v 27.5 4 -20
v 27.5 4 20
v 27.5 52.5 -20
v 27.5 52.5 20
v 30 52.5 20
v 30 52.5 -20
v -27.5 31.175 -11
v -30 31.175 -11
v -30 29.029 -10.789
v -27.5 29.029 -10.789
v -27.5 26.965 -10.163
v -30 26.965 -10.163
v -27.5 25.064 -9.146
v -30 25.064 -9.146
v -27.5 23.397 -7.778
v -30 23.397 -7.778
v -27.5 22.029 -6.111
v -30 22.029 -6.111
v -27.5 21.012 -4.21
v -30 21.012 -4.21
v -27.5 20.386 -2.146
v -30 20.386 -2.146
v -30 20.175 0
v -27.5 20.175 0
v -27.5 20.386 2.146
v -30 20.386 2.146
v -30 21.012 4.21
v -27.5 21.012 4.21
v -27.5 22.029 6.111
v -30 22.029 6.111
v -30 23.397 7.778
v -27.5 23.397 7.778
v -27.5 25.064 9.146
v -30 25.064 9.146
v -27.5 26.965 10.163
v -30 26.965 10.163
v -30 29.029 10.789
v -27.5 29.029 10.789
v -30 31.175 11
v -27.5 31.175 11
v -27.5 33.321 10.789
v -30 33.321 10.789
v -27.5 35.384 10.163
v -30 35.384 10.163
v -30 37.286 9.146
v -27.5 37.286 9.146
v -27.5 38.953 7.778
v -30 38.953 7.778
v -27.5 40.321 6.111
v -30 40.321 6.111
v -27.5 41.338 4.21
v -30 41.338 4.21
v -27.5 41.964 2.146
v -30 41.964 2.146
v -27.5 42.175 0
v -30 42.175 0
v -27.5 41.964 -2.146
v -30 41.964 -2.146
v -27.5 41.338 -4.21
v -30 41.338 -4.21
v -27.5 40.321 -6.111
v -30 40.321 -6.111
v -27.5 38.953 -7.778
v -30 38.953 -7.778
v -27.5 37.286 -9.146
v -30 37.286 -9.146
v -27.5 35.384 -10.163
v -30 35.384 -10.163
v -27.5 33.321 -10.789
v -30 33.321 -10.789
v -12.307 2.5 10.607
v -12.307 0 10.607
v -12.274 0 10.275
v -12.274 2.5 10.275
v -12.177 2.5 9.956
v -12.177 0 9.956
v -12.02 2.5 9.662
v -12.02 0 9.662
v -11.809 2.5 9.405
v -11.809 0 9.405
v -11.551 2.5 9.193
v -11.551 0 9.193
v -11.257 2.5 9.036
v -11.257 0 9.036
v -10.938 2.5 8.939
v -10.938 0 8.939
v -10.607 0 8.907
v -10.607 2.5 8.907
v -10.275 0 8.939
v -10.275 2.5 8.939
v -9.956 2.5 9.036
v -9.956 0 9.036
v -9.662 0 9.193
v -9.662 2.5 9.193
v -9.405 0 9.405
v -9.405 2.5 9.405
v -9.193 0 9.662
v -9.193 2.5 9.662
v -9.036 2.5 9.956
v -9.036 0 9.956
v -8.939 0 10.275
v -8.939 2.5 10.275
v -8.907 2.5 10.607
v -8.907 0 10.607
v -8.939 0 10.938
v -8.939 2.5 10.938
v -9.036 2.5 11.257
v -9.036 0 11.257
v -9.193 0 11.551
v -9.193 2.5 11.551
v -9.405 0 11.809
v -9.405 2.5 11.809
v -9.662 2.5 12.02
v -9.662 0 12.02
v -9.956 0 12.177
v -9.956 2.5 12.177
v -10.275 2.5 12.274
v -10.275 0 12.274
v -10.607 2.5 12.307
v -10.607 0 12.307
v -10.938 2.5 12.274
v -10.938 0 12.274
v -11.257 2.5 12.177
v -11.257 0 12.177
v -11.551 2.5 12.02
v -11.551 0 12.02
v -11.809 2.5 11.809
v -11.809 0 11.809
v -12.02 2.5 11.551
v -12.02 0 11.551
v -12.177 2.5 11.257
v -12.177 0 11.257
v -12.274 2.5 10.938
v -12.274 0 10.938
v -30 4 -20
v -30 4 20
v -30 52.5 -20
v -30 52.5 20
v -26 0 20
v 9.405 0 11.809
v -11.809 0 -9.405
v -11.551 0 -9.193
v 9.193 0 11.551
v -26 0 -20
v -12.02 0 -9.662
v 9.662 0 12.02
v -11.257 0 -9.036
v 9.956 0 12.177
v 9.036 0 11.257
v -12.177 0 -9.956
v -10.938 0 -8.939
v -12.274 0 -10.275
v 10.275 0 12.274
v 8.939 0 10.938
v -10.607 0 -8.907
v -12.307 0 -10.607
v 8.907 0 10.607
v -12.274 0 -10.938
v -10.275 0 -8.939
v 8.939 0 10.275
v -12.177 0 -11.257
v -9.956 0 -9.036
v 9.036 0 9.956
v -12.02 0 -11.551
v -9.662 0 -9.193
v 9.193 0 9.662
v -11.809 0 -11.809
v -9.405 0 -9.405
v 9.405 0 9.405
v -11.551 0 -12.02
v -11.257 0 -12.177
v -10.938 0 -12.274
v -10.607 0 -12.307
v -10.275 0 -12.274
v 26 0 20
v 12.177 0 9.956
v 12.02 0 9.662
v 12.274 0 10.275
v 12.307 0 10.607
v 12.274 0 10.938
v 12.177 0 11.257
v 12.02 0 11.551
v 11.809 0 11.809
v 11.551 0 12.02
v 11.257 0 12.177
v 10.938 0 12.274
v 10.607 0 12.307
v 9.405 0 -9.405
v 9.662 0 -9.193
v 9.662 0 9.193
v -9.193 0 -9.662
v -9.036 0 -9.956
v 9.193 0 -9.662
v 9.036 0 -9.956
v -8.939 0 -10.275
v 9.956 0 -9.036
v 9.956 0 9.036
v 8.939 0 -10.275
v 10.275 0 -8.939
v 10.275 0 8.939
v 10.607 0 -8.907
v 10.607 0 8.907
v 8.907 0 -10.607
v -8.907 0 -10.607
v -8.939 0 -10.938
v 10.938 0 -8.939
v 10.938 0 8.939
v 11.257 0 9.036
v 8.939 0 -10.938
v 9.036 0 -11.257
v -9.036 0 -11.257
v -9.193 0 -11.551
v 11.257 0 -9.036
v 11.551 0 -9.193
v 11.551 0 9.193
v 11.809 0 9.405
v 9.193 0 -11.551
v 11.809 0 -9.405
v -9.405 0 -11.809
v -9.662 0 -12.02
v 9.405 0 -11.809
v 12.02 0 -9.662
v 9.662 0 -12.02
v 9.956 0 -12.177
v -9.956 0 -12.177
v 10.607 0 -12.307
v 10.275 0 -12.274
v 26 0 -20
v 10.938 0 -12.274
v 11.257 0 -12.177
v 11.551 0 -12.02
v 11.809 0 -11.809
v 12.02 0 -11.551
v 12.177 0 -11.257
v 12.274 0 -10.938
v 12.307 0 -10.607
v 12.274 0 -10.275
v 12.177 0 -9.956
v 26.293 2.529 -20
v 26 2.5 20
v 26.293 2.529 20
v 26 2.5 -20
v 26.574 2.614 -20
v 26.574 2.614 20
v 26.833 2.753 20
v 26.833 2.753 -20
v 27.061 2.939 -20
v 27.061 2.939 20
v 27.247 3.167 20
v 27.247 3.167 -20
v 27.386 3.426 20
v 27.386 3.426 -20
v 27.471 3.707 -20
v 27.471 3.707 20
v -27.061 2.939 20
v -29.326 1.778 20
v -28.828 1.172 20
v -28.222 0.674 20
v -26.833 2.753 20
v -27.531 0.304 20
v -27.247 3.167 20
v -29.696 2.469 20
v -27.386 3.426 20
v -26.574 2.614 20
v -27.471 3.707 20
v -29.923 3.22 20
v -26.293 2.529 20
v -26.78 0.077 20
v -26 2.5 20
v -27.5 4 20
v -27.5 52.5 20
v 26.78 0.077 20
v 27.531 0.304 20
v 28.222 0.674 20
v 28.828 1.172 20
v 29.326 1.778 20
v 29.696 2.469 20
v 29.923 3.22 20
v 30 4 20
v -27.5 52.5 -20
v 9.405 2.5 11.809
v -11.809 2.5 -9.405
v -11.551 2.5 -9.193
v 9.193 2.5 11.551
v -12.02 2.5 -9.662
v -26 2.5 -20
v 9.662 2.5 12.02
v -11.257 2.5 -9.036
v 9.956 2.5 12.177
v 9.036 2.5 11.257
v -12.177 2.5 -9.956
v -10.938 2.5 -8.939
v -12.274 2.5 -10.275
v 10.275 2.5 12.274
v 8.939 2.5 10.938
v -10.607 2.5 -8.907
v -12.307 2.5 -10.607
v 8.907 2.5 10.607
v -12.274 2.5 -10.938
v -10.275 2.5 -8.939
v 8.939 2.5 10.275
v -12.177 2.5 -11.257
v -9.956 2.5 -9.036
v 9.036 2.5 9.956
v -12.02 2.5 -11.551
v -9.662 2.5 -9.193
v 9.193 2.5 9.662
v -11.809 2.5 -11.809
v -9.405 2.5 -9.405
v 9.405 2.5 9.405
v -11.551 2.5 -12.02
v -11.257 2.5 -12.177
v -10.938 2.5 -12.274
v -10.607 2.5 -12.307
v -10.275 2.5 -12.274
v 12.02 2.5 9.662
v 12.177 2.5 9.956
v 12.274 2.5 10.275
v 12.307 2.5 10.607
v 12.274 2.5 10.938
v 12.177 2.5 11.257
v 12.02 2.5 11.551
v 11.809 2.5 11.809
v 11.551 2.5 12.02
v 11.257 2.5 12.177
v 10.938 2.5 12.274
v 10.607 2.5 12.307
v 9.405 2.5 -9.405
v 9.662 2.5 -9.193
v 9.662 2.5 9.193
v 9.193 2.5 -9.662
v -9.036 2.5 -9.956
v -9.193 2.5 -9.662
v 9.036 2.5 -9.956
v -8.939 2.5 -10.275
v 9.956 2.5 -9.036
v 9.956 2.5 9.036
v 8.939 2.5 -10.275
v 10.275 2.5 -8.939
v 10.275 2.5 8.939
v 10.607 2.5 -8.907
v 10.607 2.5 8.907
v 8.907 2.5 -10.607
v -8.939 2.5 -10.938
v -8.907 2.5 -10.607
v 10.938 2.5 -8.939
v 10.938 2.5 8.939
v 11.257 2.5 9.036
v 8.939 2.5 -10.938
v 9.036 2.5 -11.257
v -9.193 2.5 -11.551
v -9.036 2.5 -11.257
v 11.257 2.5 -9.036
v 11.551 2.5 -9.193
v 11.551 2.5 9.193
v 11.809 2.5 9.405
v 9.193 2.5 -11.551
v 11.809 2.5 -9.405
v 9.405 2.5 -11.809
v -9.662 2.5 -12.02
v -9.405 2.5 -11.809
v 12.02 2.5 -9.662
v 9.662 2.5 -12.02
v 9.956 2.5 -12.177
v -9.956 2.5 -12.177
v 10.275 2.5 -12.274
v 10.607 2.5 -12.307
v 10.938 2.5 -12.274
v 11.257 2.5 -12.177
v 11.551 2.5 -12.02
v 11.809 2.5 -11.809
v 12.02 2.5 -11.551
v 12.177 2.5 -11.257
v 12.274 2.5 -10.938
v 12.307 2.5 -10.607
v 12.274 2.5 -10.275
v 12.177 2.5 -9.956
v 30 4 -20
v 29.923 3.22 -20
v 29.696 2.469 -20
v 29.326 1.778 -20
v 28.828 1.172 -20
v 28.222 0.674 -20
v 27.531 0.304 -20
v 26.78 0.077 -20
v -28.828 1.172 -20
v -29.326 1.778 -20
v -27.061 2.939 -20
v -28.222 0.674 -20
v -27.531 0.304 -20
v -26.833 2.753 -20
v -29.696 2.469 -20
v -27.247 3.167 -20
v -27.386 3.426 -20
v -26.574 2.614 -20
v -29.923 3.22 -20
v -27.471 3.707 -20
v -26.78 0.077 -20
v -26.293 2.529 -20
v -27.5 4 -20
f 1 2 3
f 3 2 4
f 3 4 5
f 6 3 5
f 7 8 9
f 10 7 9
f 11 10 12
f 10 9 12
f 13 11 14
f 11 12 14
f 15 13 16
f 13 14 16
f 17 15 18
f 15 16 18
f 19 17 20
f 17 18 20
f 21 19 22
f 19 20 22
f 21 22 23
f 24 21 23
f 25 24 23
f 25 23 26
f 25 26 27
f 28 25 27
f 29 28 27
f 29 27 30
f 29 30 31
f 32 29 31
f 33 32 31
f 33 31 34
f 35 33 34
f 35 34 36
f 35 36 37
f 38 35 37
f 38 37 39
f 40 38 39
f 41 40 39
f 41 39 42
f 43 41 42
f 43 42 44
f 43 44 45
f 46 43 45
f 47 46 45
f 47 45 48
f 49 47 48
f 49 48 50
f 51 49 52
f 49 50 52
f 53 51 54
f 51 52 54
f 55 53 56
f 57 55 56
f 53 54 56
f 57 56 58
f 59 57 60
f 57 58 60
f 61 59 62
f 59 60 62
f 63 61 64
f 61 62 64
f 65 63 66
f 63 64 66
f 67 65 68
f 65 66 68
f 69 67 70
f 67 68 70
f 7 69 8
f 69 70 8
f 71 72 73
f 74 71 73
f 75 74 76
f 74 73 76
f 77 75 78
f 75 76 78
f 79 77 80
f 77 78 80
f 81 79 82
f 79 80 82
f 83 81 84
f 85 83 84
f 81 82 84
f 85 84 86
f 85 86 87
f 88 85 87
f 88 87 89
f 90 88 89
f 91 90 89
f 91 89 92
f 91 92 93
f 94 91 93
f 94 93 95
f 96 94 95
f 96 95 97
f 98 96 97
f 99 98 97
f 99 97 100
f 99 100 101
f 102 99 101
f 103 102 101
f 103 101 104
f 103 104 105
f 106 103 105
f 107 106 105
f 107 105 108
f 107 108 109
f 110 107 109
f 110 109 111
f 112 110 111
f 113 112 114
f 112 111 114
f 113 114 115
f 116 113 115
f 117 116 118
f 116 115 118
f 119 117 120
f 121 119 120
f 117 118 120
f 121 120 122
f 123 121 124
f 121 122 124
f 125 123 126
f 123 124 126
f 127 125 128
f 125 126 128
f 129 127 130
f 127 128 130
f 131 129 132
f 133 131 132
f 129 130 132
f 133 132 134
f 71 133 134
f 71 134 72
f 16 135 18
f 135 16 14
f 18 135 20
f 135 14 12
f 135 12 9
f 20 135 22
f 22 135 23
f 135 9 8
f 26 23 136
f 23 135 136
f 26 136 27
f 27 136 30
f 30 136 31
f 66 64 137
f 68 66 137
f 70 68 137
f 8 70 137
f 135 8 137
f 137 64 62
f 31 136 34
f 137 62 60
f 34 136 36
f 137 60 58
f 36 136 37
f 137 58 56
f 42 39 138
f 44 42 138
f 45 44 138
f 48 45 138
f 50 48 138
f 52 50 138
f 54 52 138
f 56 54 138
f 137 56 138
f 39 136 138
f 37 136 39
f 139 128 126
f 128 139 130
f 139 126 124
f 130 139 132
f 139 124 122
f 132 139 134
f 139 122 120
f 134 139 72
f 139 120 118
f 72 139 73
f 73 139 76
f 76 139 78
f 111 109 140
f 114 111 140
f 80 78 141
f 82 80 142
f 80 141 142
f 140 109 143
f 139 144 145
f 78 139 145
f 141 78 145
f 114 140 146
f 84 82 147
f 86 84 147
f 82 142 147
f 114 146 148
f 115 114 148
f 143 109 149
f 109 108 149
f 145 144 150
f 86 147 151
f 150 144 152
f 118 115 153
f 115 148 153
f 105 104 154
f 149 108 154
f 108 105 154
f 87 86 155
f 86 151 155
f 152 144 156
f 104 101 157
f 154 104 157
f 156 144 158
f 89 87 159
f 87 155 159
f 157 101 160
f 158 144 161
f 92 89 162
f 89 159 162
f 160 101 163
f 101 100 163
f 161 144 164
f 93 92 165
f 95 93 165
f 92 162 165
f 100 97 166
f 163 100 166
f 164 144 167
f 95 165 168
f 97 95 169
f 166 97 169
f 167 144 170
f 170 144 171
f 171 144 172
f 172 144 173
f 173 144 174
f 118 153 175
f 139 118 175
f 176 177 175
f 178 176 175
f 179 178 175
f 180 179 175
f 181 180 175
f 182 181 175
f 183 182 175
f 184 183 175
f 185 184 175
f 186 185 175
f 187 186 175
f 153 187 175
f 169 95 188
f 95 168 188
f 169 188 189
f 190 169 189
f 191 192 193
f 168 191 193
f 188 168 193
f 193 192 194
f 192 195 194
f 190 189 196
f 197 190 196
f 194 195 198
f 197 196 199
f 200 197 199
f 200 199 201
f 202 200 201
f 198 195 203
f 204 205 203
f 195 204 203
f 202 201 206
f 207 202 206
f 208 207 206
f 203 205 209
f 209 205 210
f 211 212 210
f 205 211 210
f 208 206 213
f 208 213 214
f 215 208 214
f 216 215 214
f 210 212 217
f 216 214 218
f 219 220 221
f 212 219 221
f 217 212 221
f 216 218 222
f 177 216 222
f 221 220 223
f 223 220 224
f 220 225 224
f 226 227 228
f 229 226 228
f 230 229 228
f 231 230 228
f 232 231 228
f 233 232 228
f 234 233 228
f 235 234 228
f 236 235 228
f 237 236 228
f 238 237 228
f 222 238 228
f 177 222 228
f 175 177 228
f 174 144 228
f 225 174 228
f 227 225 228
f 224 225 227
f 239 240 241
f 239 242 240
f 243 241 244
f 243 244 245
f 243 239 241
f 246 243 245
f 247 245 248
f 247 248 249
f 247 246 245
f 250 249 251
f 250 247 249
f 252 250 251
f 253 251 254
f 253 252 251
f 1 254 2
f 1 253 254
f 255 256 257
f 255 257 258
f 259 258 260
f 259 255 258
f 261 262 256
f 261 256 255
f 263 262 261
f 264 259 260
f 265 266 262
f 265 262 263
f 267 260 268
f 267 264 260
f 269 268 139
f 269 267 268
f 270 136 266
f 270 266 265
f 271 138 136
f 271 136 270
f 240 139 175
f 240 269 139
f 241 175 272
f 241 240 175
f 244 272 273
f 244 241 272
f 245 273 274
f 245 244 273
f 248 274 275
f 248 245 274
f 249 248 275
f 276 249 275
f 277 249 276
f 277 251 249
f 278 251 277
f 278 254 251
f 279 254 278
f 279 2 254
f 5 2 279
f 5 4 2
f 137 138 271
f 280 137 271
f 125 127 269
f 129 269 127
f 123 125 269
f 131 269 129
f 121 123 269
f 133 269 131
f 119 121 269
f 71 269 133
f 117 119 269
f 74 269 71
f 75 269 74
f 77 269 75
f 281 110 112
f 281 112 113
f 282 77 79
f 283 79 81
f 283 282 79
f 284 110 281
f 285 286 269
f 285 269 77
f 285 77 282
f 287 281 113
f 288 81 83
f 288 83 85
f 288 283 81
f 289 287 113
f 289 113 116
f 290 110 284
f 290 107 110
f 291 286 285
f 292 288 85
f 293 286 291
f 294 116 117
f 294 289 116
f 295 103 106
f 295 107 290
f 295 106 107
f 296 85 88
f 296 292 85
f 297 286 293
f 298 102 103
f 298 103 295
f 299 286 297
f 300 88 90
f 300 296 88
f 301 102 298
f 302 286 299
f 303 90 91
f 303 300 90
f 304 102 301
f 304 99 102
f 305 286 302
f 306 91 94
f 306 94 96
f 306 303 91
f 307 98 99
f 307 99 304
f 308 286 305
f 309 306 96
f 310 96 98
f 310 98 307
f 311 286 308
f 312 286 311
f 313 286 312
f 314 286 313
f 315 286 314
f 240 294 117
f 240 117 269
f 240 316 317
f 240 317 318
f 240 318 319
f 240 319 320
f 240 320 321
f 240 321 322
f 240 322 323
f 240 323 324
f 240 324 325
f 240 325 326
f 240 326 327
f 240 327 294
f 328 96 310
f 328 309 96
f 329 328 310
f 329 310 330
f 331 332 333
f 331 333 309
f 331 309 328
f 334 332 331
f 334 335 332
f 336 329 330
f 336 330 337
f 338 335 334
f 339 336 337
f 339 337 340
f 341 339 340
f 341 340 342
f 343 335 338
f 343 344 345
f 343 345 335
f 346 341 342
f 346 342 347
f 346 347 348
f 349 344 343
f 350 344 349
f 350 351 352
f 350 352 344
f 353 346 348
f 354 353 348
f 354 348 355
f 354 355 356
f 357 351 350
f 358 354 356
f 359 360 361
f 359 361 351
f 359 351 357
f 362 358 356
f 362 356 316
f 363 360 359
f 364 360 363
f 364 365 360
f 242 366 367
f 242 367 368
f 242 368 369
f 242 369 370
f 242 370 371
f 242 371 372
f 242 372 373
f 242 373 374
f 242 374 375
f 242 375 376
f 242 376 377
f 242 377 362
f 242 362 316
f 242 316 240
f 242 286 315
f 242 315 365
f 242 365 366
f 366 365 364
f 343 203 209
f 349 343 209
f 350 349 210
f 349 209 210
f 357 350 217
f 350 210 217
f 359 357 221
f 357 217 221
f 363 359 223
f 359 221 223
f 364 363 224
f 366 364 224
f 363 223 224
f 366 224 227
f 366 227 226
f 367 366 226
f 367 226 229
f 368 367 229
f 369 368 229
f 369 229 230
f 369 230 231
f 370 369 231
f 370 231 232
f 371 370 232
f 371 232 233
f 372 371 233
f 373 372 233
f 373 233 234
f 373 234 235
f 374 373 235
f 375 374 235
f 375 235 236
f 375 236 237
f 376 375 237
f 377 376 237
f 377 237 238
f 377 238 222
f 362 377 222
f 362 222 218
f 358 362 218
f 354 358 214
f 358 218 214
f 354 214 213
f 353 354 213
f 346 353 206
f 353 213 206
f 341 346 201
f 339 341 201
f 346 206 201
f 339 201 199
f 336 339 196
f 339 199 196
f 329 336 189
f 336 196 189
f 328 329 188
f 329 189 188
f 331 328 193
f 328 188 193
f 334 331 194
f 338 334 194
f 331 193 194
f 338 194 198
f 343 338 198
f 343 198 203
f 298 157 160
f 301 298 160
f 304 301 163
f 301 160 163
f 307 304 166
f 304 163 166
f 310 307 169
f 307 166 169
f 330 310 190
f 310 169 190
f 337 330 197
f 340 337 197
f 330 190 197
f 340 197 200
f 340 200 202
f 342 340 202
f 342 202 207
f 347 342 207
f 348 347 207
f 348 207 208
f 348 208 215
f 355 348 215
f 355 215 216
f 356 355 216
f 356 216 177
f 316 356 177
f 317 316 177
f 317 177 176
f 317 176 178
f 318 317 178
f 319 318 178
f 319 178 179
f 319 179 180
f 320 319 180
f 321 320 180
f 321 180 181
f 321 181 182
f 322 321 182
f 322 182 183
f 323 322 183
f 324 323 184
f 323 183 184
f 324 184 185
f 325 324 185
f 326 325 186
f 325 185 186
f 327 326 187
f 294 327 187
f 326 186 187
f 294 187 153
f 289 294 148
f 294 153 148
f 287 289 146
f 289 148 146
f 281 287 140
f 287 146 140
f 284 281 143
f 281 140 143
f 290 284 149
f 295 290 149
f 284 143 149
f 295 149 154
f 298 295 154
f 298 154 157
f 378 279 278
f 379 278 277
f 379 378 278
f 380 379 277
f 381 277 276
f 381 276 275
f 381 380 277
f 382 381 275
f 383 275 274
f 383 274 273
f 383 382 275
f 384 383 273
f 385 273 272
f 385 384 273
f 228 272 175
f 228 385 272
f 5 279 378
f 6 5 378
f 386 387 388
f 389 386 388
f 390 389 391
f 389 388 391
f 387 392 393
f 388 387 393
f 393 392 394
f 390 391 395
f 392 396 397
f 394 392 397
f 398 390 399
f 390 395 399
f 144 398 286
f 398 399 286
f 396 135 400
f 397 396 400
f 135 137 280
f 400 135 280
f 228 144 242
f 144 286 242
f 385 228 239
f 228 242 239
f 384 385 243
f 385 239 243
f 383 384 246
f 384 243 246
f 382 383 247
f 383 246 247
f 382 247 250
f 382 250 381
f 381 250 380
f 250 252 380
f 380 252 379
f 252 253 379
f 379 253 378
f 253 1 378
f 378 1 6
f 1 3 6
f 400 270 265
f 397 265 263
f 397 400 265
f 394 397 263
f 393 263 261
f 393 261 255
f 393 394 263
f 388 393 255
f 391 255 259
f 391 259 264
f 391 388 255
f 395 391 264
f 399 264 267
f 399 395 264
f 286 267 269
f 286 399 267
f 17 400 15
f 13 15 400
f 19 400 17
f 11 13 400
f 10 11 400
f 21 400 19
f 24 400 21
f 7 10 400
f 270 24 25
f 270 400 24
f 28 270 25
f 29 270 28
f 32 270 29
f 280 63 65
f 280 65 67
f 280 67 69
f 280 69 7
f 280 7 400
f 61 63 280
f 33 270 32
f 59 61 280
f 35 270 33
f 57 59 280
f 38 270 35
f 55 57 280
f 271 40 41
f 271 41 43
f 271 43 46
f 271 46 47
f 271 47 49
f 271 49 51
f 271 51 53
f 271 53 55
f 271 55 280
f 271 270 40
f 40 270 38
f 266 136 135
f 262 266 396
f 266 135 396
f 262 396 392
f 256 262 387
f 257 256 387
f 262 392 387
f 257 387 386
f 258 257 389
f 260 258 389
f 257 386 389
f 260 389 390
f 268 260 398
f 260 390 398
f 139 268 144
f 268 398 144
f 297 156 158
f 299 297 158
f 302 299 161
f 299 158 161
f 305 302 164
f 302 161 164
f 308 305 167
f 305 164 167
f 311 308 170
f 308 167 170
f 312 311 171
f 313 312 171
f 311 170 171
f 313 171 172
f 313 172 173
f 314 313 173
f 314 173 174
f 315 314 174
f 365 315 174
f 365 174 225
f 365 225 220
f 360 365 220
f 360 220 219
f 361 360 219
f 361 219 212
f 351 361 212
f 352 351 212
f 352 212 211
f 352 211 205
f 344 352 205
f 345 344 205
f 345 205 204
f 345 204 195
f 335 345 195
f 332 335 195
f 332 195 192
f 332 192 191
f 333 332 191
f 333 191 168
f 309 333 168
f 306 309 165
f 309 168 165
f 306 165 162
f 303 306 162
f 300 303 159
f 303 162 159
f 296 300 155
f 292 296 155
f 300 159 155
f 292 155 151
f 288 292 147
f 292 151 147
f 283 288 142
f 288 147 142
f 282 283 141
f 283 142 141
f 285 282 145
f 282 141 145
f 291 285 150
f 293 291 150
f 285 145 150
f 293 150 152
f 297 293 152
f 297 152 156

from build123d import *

# Parameters (mm, degrees)
SKETCH1_W                      = 60
SKETCH1_H                      = 40
BOSS_EXTRUDE1_DEPTH            = 2.5
M3_CLEARANCE_HOLE1_D           = 3.4
SKETCH4_W                      = 2.5
SKETCH4_H                      = 50
BOSS_EXTRUDE2_DEPTH            = 40
FILLET1_R                      = 4
FILLET2_R                      = 1.5
CUT_EXTRUDE1_REACH             = 84.196
SKETCH6_R                      = 11
CUT_EXTRUDE1_DIRECTION_2_DEPTH = 83.196411114


with BuildPart() as part:
    # Sketch1 → Boss-Extrude1 (new body)
    with BuildSketch(Plane(origin=(0, 0, 0), x_dir=(1, 0, 0), z_dir=(0, 1, 0))):
        Rectangle(SKETCH1_W, SKETCH1_H)
    extrude(amount=BOSS_EXTRUDE1_DEPTH)

    # M3 Clearance Hole1 (through all)
    with Locations(Plane(origin=(0, 2.5, 0), x_dir=(1, 0, 0), z_dir=(0, 1, 0))):
        with Locations((-10.606601718, 10.606601718), (10.606601718, 10.606601718), (10.606601718, -10.606601718), (-10.606601718, -10.606601718)):
            Hole(M3_CLEARANCE_HOLE1_D / 2)

    # Sketch4 → Boss-Extrude2 (add)
    with BuildSketch(Plane.XY.offset(20)):
        with Locations((-28.75, 27.5)):
            Rectangle(SKETCH4_W, SKETCH4_H)
        with Locations((28.75, 27.5)):
            Rectangle(SKETCH4_W, SKETCH4_H)
    extrude(amount=-BOSS_EXTRUDE2_DEPTH)

    # Fillet1
    fillet1_edges = [part.edges().sort_by_distance(p)[0] for p in [
        (-30, 0, 0),
        (30, 0, 0),
    ]]
    fillet(fillet1_edges, radius=FILLET1_R)

    # Fillet2
    fillet2_edges = [part.edges().sort_by_distance(p)[0] for p in [
        (-27.5, 2.5, 0),
        (27.5, 2.5, 0),
    ]]
    fillet(fillet2_edges, radius=FILLET2_R)

    # Sketch6 → Cut-Extrude1 (cut, up to next)
    with BuildSketch(Plane.ZY.offset(30), mode=Mode.PRIVATE) as cut_extrude1_sk1:
        with Locations(Location((0, 31.17493075, 0), (0, 0, 180))):
            Circle(SKETCH6_R)
    cut_extrude1_tool1 = extrude(cut_extrude1_sk1.sketch, amount=-CUT_EXTRUDE1_REACH, mode=Mode.PRIVATE) & part.part
    add(cut_extrude1_tool1.solids().sort_by_distance((-30, 31.174931, 0))[0], mode=Mode.SUBTRACT)

    # Sketch6 → Cut-Extrude1 direction 2 (cut)
    with BuildSketch(Plane.ZY.offset(30)):
        with Locations(Location((0, 31.17493075, 0), (0, 0, 180))):
            Circle(SKETCH6_R)
    extrude(amount=CUT_EXTRUDE1_DIRECTION_2_DEPTH, mode=Mode.SUBTRACT)


solid = part.part
